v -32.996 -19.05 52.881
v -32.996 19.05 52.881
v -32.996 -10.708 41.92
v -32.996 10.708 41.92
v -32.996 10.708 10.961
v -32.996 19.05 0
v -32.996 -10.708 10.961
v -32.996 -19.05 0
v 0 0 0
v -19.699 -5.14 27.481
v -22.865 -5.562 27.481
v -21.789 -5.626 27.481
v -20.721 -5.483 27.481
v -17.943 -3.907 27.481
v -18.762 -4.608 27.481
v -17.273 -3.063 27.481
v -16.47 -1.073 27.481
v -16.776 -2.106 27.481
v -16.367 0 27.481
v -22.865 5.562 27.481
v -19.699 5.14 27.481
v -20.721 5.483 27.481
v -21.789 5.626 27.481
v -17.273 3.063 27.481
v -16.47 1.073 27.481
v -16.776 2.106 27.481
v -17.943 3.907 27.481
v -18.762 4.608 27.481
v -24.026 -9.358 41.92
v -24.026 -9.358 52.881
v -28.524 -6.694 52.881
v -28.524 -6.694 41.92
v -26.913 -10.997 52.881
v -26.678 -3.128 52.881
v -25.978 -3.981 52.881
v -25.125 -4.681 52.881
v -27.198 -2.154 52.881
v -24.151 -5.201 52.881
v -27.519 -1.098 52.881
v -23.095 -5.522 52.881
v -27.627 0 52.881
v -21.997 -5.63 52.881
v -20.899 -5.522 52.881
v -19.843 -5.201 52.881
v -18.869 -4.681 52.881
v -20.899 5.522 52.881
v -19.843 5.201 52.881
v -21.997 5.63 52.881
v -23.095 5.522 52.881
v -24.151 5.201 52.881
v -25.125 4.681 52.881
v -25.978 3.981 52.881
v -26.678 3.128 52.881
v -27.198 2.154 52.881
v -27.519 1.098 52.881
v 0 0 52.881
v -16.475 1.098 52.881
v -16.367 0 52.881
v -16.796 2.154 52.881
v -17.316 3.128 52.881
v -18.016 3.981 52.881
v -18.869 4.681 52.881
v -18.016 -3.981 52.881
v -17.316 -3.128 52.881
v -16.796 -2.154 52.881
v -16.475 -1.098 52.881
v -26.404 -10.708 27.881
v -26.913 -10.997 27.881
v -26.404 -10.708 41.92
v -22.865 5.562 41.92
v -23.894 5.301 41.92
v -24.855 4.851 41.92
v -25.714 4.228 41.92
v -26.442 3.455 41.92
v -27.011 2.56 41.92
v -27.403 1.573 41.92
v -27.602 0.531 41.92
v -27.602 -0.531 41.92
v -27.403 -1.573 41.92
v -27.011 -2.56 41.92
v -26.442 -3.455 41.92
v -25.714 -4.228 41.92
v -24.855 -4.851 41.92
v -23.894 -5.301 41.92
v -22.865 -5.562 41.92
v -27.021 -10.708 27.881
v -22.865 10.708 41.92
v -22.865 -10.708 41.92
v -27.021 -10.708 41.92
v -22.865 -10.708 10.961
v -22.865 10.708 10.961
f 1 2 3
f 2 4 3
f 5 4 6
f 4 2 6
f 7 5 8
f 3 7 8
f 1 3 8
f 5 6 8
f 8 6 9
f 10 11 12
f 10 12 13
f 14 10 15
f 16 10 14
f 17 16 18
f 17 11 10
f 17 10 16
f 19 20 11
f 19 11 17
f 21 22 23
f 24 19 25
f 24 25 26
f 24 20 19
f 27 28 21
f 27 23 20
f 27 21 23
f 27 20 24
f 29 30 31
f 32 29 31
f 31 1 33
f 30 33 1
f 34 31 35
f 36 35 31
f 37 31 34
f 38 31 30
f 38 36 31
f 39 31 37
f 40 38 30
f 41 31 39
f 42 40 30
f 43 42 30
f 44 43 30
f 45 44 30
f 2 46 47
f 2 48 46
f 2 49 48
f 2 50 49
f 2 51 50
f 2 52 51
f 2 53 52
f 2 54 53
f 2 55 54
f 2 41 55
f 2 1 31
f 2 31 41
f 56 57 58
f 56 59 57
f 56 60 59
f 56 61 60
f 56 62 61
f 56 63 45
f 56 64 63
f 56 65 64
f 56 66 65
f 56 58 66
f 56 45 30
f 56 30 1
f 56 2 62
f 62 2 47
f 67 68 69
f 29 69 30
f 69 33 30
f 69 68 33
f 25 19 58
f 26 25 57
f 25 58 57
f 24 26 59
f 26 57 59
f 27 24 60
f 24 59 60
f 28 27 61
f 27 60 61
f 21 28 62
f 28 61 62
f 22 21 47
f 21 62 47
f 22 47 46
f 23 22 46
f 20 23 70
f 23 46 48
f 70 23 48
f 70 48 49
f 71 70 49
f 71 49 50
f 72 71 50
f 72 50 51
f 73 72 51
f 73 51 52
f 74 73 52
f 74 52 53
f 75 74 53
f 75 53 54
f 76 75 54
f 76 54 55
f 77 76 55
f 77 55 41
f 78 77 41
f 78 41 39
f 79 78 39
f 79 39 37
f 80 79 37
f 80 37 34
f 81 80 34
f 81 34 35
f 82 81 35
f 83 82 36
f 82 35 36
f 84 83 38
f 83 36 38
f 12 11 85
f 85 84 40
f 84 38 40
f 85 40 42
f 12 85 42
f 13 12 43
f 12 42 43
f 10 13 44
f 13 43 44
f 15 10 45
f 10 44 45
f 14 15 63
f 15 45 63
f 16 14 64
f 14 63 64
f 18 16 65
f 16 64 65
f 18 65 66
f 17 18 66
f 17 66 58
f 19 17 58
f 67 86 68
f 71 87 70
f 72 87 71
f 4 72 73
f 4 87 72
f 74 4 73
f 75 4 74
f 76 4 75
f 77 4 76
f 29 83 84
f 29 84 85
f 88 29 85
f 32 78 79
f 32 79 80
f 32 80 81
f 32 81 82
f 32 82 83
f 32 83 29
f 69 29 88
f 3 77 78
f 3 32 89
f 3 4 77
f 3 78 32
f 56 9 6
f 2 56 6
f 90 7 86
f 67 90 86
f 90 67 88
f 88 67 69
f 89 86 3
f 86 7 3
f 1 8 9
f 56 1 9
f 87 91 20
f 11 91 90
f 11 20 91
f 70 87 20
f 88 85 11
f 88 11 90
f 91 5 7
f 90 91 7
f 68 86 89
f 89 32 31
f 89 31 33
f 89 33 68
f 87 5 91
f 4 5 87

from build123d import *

# Parameters (mm, degrees)
F1_DEPTH = 52.88097
F2_R     = 5.629774
F3_DEPTH = 25.4
F4_W     = 21.416974
F4_H     = 30.958728
F5_DEPTH = 10.13054
F7_DEPTH = 25


with BuildPart() as f1:
    # F0 (on Top) → F1 (new body)
    with BuildSketch(Plane.XY):
        Polygon((-32.995568, -19.05), (0, 0), (-32.995568, 19.05), align=None)
    extrude(amount=F1_DEPTH)

    # F2 (on face) → F3 (cut)
    with BuildSketch(Plane.XY.offset(52.88097)):
        with Locations((-21.997045, 0)):
            Circle(F2_R)
    extrude(amount=-F3_DEPTH, mode=Mode.SUBTRACT)

    # F4 (on face) → F5 (cut)
    with BuildSketch(Plane(origin=(-32.995568, 0, 0), x_dir=(0, -1, 0), z_dir=(-1, 0, 0))):
        with Locations((0, 26.440485)):
            Rectangle(F4_W, F4_H)
    extrude(amount=-F5_DEPTH, mode=Mode.SUBTRACT)

    # F6 (on face) → F7 (cut)
    with BuildSketch(Plane.XY.offset(52.88097)):
        Polygon((-24.02568, -9.358168), (-28.524186, -6.694105), (-26.91254, -10.997219), align=None)
    extrude(amount=-F7_DEPTH, mode=Mode.SUBTRACT)


solid = f1.part
